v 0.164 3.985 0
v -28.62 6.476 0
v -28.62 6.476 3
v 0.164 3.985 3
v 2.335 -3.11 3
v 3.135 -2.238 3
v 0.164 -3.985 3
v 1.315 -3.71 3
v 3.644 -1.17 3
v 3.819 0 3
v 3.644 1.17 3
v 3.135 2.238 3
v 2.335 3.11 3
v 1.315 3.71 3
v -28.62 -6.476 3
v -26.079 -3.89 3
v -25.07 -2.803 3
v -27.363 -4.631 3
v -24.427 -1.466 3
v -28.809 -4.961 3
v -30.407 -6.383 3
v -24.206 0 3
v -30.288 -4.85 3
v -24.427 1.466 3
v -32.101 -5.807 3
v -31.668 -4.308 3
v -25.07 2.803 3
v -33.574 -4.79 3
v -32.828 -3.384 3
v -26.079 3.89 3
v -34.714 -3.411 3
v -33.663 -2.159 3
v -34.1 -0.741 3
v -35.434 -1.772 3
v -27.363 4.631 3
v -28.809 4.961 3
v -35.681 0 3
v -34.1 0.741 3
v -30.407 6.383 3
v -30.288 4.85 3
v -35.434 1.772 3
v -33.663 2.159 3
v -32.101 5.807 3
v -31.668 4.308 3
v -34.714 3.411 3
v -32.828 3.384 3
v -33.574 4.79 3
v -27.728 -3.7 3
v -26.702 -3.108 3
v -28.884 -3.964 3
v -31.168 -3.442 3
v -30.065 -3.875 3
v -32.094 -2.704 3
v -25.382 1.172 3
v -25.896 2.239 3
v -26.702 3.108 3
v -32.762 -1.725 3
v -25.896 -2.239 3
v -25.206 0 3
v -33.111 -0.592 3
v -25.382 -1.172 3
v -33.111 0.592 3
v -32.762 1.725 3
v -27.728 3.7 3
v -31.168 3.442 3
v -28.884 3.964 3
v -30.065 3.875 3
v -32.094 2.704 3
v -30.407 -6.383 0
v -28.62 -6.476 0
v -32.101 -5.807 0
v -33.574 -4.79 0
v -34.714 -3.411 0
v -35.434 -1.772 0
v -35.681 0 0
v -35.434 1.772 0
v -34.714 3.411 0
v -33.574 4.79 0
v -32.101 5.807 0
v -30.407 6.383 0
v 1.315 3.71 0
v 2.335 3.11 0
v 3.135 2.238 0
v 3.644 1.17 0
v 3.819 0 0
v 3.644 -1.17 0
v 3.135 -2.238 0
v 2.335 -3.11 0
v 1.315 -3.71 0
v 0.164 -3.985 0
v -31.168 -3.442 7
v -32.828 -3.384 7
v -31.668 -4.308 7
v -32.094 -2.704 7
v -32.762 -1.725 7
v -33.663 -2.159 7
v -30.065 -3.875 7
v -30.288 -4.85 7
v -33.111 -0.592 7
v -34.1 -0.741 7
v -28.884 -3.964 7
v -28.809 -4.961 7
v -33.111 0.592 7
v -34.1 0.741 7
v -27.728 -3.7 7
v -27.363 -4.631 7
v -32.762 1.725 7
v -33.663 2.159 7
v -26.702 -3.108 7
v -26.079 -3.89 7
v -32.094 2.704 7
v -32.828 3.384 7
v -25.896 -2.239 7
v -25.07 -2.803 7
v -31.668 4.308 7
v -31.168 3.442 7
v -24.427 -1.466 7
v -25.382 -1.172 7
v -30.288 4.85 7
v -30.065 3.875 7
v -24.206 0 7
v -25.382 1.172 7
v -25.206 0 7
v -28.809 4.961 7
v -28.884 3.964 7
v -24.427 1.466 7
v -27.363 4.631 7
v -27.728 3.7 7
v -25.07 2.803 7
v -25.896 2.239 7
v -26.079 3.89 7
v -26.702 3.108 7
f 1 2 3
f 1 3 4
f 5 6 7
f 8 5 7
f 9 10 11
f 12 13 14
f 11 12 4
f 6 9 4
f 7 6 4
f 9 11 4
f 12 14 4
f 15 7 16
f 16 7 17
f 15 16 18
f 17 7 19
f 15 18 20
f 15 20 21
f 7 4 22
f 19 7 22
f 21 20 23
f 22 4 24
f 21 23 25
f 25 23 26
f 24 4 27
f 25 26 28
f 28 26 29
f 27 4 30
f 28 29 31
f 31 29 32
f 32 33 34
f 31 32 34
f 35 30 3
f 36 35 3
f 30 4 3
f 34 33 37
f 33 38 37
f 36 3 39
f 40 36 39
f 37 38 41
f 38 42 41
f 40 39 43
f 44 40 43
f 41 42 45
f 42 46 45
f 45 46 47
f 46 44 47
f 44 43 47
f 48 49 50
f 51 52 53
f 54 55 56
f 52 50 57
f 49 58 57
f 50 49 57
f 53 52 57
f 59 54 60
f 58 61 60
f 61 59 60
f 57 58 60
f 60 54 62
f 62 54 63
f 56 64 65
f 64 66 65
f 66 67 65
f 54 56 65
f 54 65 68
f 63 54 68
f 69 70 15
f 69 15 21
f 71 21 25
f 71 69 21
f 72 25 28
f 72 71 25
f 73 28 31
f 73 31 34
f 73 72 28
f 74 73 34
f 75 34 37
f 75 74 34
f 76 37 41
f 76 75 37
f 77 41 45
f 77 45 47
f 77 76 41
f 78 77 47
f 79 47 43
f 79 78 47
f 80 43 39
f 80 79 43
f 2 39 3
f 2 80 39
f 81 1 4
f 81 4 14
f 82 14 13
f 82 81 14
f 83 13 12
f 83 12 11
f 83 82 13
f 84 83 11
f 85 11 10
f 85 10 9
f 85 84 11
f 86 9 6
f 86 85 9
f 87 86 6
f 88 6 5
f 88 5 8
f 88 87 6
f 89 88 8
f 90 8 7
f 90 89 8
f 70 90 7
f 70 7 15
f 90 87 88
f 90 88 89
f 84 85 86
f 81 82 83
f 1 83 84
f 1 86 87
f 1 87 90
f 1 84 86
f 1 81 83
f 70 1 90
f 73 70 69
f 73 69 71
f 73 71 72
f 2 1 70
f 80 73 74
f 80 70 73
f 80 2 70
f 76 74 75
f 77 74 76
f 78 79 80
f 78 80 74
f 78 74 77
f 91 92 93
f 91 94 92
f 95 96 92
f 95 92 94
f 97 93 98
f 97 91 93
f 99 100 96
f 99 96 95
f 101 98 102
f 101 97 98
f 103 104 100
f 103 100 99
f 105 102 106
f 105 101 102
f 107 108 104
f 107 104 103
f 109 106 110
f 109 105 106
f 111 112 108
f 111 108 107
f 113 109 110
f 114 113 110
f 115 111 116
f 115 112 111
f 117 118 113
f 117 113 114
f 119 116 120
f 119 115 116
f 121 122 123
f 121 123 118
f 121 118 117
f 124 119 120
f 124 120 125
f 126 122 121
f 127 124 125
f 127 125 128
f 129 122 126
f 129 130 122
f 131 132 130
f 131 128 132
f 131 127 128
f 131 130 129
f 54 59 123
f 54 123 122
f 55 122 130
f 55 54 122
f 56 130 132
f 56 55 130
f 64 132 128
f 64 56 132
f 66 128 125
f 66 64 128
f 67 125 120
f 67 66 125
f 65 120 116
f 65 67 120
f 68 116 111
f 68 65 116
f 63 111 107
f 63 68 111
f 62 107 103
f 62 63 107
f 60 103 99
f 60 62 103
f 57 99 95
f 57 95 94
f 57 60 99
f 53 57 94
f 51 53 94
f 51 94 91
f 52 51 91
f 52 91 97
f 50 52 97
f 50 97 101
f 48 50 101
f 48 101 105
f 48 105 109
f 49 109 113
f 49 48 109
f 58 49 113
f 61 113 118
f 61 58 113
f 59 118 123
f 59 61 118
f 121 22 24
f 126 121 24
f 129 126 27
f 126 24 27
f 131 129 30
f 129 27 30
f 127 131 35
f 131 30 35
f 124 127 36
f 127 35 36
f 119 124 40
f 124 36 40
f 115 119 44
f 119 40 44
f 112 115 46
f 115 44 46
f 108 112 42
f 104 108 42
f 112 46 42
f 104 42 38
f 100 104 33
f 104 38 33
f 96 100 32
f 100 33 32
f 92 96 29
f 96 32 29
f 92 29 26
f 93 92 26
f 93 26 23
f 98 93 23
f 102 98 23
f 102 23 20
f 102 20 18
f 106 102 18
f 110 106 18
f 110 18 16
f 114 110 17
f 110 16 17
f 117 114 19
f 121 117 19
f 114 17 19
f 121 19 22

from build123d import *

# Parameters (mm, degrees)
BOSS_EXTRUDE1_DEPTH = 3
SKETCH2_R           = 4.975
SKETCH2_R_2         = 3.975
EXTRUDE_THIN1_DEPTH = 4


with BuildPart() as part:
    # Sketch1 → Boss-Extrude1 (new body)
    with BuildSketch(Plane.XY):
        with BuildLine():
            Line((-28.620254205, 6.475802165), (0.164228554, 3.985109024))
            ThreePointArc((0.164228554, 3.985109024), (3.819400968, 0), (0.164228554, -3.985109024))
            Line((0.164228554, -3.985109024), (-28.620254205, -6.475802165))
            ThreePointArc((-28.620254205, -6.475802165), (-35.680599032, 0), (-28.620254205, 6.475802165))
        make_face()
    extrude(amount=BOSS_EXTRUDE1_DEPTH)

    # Sketch2 → Extrude-Thin1 (add)
    with BuildSketch(Plane.XY.offset(3)):
        with Locations((-29.180599032, 0)):
            Circle(SKETCH2_R)
        with Locations((-29.180599032, 0)):
            Circle(SKETCH2_R_2, mode=Mode.SUBTRACT)
    extrude(amount=EXTRUDE_THIN1_DEPTH)


solid = part.part
